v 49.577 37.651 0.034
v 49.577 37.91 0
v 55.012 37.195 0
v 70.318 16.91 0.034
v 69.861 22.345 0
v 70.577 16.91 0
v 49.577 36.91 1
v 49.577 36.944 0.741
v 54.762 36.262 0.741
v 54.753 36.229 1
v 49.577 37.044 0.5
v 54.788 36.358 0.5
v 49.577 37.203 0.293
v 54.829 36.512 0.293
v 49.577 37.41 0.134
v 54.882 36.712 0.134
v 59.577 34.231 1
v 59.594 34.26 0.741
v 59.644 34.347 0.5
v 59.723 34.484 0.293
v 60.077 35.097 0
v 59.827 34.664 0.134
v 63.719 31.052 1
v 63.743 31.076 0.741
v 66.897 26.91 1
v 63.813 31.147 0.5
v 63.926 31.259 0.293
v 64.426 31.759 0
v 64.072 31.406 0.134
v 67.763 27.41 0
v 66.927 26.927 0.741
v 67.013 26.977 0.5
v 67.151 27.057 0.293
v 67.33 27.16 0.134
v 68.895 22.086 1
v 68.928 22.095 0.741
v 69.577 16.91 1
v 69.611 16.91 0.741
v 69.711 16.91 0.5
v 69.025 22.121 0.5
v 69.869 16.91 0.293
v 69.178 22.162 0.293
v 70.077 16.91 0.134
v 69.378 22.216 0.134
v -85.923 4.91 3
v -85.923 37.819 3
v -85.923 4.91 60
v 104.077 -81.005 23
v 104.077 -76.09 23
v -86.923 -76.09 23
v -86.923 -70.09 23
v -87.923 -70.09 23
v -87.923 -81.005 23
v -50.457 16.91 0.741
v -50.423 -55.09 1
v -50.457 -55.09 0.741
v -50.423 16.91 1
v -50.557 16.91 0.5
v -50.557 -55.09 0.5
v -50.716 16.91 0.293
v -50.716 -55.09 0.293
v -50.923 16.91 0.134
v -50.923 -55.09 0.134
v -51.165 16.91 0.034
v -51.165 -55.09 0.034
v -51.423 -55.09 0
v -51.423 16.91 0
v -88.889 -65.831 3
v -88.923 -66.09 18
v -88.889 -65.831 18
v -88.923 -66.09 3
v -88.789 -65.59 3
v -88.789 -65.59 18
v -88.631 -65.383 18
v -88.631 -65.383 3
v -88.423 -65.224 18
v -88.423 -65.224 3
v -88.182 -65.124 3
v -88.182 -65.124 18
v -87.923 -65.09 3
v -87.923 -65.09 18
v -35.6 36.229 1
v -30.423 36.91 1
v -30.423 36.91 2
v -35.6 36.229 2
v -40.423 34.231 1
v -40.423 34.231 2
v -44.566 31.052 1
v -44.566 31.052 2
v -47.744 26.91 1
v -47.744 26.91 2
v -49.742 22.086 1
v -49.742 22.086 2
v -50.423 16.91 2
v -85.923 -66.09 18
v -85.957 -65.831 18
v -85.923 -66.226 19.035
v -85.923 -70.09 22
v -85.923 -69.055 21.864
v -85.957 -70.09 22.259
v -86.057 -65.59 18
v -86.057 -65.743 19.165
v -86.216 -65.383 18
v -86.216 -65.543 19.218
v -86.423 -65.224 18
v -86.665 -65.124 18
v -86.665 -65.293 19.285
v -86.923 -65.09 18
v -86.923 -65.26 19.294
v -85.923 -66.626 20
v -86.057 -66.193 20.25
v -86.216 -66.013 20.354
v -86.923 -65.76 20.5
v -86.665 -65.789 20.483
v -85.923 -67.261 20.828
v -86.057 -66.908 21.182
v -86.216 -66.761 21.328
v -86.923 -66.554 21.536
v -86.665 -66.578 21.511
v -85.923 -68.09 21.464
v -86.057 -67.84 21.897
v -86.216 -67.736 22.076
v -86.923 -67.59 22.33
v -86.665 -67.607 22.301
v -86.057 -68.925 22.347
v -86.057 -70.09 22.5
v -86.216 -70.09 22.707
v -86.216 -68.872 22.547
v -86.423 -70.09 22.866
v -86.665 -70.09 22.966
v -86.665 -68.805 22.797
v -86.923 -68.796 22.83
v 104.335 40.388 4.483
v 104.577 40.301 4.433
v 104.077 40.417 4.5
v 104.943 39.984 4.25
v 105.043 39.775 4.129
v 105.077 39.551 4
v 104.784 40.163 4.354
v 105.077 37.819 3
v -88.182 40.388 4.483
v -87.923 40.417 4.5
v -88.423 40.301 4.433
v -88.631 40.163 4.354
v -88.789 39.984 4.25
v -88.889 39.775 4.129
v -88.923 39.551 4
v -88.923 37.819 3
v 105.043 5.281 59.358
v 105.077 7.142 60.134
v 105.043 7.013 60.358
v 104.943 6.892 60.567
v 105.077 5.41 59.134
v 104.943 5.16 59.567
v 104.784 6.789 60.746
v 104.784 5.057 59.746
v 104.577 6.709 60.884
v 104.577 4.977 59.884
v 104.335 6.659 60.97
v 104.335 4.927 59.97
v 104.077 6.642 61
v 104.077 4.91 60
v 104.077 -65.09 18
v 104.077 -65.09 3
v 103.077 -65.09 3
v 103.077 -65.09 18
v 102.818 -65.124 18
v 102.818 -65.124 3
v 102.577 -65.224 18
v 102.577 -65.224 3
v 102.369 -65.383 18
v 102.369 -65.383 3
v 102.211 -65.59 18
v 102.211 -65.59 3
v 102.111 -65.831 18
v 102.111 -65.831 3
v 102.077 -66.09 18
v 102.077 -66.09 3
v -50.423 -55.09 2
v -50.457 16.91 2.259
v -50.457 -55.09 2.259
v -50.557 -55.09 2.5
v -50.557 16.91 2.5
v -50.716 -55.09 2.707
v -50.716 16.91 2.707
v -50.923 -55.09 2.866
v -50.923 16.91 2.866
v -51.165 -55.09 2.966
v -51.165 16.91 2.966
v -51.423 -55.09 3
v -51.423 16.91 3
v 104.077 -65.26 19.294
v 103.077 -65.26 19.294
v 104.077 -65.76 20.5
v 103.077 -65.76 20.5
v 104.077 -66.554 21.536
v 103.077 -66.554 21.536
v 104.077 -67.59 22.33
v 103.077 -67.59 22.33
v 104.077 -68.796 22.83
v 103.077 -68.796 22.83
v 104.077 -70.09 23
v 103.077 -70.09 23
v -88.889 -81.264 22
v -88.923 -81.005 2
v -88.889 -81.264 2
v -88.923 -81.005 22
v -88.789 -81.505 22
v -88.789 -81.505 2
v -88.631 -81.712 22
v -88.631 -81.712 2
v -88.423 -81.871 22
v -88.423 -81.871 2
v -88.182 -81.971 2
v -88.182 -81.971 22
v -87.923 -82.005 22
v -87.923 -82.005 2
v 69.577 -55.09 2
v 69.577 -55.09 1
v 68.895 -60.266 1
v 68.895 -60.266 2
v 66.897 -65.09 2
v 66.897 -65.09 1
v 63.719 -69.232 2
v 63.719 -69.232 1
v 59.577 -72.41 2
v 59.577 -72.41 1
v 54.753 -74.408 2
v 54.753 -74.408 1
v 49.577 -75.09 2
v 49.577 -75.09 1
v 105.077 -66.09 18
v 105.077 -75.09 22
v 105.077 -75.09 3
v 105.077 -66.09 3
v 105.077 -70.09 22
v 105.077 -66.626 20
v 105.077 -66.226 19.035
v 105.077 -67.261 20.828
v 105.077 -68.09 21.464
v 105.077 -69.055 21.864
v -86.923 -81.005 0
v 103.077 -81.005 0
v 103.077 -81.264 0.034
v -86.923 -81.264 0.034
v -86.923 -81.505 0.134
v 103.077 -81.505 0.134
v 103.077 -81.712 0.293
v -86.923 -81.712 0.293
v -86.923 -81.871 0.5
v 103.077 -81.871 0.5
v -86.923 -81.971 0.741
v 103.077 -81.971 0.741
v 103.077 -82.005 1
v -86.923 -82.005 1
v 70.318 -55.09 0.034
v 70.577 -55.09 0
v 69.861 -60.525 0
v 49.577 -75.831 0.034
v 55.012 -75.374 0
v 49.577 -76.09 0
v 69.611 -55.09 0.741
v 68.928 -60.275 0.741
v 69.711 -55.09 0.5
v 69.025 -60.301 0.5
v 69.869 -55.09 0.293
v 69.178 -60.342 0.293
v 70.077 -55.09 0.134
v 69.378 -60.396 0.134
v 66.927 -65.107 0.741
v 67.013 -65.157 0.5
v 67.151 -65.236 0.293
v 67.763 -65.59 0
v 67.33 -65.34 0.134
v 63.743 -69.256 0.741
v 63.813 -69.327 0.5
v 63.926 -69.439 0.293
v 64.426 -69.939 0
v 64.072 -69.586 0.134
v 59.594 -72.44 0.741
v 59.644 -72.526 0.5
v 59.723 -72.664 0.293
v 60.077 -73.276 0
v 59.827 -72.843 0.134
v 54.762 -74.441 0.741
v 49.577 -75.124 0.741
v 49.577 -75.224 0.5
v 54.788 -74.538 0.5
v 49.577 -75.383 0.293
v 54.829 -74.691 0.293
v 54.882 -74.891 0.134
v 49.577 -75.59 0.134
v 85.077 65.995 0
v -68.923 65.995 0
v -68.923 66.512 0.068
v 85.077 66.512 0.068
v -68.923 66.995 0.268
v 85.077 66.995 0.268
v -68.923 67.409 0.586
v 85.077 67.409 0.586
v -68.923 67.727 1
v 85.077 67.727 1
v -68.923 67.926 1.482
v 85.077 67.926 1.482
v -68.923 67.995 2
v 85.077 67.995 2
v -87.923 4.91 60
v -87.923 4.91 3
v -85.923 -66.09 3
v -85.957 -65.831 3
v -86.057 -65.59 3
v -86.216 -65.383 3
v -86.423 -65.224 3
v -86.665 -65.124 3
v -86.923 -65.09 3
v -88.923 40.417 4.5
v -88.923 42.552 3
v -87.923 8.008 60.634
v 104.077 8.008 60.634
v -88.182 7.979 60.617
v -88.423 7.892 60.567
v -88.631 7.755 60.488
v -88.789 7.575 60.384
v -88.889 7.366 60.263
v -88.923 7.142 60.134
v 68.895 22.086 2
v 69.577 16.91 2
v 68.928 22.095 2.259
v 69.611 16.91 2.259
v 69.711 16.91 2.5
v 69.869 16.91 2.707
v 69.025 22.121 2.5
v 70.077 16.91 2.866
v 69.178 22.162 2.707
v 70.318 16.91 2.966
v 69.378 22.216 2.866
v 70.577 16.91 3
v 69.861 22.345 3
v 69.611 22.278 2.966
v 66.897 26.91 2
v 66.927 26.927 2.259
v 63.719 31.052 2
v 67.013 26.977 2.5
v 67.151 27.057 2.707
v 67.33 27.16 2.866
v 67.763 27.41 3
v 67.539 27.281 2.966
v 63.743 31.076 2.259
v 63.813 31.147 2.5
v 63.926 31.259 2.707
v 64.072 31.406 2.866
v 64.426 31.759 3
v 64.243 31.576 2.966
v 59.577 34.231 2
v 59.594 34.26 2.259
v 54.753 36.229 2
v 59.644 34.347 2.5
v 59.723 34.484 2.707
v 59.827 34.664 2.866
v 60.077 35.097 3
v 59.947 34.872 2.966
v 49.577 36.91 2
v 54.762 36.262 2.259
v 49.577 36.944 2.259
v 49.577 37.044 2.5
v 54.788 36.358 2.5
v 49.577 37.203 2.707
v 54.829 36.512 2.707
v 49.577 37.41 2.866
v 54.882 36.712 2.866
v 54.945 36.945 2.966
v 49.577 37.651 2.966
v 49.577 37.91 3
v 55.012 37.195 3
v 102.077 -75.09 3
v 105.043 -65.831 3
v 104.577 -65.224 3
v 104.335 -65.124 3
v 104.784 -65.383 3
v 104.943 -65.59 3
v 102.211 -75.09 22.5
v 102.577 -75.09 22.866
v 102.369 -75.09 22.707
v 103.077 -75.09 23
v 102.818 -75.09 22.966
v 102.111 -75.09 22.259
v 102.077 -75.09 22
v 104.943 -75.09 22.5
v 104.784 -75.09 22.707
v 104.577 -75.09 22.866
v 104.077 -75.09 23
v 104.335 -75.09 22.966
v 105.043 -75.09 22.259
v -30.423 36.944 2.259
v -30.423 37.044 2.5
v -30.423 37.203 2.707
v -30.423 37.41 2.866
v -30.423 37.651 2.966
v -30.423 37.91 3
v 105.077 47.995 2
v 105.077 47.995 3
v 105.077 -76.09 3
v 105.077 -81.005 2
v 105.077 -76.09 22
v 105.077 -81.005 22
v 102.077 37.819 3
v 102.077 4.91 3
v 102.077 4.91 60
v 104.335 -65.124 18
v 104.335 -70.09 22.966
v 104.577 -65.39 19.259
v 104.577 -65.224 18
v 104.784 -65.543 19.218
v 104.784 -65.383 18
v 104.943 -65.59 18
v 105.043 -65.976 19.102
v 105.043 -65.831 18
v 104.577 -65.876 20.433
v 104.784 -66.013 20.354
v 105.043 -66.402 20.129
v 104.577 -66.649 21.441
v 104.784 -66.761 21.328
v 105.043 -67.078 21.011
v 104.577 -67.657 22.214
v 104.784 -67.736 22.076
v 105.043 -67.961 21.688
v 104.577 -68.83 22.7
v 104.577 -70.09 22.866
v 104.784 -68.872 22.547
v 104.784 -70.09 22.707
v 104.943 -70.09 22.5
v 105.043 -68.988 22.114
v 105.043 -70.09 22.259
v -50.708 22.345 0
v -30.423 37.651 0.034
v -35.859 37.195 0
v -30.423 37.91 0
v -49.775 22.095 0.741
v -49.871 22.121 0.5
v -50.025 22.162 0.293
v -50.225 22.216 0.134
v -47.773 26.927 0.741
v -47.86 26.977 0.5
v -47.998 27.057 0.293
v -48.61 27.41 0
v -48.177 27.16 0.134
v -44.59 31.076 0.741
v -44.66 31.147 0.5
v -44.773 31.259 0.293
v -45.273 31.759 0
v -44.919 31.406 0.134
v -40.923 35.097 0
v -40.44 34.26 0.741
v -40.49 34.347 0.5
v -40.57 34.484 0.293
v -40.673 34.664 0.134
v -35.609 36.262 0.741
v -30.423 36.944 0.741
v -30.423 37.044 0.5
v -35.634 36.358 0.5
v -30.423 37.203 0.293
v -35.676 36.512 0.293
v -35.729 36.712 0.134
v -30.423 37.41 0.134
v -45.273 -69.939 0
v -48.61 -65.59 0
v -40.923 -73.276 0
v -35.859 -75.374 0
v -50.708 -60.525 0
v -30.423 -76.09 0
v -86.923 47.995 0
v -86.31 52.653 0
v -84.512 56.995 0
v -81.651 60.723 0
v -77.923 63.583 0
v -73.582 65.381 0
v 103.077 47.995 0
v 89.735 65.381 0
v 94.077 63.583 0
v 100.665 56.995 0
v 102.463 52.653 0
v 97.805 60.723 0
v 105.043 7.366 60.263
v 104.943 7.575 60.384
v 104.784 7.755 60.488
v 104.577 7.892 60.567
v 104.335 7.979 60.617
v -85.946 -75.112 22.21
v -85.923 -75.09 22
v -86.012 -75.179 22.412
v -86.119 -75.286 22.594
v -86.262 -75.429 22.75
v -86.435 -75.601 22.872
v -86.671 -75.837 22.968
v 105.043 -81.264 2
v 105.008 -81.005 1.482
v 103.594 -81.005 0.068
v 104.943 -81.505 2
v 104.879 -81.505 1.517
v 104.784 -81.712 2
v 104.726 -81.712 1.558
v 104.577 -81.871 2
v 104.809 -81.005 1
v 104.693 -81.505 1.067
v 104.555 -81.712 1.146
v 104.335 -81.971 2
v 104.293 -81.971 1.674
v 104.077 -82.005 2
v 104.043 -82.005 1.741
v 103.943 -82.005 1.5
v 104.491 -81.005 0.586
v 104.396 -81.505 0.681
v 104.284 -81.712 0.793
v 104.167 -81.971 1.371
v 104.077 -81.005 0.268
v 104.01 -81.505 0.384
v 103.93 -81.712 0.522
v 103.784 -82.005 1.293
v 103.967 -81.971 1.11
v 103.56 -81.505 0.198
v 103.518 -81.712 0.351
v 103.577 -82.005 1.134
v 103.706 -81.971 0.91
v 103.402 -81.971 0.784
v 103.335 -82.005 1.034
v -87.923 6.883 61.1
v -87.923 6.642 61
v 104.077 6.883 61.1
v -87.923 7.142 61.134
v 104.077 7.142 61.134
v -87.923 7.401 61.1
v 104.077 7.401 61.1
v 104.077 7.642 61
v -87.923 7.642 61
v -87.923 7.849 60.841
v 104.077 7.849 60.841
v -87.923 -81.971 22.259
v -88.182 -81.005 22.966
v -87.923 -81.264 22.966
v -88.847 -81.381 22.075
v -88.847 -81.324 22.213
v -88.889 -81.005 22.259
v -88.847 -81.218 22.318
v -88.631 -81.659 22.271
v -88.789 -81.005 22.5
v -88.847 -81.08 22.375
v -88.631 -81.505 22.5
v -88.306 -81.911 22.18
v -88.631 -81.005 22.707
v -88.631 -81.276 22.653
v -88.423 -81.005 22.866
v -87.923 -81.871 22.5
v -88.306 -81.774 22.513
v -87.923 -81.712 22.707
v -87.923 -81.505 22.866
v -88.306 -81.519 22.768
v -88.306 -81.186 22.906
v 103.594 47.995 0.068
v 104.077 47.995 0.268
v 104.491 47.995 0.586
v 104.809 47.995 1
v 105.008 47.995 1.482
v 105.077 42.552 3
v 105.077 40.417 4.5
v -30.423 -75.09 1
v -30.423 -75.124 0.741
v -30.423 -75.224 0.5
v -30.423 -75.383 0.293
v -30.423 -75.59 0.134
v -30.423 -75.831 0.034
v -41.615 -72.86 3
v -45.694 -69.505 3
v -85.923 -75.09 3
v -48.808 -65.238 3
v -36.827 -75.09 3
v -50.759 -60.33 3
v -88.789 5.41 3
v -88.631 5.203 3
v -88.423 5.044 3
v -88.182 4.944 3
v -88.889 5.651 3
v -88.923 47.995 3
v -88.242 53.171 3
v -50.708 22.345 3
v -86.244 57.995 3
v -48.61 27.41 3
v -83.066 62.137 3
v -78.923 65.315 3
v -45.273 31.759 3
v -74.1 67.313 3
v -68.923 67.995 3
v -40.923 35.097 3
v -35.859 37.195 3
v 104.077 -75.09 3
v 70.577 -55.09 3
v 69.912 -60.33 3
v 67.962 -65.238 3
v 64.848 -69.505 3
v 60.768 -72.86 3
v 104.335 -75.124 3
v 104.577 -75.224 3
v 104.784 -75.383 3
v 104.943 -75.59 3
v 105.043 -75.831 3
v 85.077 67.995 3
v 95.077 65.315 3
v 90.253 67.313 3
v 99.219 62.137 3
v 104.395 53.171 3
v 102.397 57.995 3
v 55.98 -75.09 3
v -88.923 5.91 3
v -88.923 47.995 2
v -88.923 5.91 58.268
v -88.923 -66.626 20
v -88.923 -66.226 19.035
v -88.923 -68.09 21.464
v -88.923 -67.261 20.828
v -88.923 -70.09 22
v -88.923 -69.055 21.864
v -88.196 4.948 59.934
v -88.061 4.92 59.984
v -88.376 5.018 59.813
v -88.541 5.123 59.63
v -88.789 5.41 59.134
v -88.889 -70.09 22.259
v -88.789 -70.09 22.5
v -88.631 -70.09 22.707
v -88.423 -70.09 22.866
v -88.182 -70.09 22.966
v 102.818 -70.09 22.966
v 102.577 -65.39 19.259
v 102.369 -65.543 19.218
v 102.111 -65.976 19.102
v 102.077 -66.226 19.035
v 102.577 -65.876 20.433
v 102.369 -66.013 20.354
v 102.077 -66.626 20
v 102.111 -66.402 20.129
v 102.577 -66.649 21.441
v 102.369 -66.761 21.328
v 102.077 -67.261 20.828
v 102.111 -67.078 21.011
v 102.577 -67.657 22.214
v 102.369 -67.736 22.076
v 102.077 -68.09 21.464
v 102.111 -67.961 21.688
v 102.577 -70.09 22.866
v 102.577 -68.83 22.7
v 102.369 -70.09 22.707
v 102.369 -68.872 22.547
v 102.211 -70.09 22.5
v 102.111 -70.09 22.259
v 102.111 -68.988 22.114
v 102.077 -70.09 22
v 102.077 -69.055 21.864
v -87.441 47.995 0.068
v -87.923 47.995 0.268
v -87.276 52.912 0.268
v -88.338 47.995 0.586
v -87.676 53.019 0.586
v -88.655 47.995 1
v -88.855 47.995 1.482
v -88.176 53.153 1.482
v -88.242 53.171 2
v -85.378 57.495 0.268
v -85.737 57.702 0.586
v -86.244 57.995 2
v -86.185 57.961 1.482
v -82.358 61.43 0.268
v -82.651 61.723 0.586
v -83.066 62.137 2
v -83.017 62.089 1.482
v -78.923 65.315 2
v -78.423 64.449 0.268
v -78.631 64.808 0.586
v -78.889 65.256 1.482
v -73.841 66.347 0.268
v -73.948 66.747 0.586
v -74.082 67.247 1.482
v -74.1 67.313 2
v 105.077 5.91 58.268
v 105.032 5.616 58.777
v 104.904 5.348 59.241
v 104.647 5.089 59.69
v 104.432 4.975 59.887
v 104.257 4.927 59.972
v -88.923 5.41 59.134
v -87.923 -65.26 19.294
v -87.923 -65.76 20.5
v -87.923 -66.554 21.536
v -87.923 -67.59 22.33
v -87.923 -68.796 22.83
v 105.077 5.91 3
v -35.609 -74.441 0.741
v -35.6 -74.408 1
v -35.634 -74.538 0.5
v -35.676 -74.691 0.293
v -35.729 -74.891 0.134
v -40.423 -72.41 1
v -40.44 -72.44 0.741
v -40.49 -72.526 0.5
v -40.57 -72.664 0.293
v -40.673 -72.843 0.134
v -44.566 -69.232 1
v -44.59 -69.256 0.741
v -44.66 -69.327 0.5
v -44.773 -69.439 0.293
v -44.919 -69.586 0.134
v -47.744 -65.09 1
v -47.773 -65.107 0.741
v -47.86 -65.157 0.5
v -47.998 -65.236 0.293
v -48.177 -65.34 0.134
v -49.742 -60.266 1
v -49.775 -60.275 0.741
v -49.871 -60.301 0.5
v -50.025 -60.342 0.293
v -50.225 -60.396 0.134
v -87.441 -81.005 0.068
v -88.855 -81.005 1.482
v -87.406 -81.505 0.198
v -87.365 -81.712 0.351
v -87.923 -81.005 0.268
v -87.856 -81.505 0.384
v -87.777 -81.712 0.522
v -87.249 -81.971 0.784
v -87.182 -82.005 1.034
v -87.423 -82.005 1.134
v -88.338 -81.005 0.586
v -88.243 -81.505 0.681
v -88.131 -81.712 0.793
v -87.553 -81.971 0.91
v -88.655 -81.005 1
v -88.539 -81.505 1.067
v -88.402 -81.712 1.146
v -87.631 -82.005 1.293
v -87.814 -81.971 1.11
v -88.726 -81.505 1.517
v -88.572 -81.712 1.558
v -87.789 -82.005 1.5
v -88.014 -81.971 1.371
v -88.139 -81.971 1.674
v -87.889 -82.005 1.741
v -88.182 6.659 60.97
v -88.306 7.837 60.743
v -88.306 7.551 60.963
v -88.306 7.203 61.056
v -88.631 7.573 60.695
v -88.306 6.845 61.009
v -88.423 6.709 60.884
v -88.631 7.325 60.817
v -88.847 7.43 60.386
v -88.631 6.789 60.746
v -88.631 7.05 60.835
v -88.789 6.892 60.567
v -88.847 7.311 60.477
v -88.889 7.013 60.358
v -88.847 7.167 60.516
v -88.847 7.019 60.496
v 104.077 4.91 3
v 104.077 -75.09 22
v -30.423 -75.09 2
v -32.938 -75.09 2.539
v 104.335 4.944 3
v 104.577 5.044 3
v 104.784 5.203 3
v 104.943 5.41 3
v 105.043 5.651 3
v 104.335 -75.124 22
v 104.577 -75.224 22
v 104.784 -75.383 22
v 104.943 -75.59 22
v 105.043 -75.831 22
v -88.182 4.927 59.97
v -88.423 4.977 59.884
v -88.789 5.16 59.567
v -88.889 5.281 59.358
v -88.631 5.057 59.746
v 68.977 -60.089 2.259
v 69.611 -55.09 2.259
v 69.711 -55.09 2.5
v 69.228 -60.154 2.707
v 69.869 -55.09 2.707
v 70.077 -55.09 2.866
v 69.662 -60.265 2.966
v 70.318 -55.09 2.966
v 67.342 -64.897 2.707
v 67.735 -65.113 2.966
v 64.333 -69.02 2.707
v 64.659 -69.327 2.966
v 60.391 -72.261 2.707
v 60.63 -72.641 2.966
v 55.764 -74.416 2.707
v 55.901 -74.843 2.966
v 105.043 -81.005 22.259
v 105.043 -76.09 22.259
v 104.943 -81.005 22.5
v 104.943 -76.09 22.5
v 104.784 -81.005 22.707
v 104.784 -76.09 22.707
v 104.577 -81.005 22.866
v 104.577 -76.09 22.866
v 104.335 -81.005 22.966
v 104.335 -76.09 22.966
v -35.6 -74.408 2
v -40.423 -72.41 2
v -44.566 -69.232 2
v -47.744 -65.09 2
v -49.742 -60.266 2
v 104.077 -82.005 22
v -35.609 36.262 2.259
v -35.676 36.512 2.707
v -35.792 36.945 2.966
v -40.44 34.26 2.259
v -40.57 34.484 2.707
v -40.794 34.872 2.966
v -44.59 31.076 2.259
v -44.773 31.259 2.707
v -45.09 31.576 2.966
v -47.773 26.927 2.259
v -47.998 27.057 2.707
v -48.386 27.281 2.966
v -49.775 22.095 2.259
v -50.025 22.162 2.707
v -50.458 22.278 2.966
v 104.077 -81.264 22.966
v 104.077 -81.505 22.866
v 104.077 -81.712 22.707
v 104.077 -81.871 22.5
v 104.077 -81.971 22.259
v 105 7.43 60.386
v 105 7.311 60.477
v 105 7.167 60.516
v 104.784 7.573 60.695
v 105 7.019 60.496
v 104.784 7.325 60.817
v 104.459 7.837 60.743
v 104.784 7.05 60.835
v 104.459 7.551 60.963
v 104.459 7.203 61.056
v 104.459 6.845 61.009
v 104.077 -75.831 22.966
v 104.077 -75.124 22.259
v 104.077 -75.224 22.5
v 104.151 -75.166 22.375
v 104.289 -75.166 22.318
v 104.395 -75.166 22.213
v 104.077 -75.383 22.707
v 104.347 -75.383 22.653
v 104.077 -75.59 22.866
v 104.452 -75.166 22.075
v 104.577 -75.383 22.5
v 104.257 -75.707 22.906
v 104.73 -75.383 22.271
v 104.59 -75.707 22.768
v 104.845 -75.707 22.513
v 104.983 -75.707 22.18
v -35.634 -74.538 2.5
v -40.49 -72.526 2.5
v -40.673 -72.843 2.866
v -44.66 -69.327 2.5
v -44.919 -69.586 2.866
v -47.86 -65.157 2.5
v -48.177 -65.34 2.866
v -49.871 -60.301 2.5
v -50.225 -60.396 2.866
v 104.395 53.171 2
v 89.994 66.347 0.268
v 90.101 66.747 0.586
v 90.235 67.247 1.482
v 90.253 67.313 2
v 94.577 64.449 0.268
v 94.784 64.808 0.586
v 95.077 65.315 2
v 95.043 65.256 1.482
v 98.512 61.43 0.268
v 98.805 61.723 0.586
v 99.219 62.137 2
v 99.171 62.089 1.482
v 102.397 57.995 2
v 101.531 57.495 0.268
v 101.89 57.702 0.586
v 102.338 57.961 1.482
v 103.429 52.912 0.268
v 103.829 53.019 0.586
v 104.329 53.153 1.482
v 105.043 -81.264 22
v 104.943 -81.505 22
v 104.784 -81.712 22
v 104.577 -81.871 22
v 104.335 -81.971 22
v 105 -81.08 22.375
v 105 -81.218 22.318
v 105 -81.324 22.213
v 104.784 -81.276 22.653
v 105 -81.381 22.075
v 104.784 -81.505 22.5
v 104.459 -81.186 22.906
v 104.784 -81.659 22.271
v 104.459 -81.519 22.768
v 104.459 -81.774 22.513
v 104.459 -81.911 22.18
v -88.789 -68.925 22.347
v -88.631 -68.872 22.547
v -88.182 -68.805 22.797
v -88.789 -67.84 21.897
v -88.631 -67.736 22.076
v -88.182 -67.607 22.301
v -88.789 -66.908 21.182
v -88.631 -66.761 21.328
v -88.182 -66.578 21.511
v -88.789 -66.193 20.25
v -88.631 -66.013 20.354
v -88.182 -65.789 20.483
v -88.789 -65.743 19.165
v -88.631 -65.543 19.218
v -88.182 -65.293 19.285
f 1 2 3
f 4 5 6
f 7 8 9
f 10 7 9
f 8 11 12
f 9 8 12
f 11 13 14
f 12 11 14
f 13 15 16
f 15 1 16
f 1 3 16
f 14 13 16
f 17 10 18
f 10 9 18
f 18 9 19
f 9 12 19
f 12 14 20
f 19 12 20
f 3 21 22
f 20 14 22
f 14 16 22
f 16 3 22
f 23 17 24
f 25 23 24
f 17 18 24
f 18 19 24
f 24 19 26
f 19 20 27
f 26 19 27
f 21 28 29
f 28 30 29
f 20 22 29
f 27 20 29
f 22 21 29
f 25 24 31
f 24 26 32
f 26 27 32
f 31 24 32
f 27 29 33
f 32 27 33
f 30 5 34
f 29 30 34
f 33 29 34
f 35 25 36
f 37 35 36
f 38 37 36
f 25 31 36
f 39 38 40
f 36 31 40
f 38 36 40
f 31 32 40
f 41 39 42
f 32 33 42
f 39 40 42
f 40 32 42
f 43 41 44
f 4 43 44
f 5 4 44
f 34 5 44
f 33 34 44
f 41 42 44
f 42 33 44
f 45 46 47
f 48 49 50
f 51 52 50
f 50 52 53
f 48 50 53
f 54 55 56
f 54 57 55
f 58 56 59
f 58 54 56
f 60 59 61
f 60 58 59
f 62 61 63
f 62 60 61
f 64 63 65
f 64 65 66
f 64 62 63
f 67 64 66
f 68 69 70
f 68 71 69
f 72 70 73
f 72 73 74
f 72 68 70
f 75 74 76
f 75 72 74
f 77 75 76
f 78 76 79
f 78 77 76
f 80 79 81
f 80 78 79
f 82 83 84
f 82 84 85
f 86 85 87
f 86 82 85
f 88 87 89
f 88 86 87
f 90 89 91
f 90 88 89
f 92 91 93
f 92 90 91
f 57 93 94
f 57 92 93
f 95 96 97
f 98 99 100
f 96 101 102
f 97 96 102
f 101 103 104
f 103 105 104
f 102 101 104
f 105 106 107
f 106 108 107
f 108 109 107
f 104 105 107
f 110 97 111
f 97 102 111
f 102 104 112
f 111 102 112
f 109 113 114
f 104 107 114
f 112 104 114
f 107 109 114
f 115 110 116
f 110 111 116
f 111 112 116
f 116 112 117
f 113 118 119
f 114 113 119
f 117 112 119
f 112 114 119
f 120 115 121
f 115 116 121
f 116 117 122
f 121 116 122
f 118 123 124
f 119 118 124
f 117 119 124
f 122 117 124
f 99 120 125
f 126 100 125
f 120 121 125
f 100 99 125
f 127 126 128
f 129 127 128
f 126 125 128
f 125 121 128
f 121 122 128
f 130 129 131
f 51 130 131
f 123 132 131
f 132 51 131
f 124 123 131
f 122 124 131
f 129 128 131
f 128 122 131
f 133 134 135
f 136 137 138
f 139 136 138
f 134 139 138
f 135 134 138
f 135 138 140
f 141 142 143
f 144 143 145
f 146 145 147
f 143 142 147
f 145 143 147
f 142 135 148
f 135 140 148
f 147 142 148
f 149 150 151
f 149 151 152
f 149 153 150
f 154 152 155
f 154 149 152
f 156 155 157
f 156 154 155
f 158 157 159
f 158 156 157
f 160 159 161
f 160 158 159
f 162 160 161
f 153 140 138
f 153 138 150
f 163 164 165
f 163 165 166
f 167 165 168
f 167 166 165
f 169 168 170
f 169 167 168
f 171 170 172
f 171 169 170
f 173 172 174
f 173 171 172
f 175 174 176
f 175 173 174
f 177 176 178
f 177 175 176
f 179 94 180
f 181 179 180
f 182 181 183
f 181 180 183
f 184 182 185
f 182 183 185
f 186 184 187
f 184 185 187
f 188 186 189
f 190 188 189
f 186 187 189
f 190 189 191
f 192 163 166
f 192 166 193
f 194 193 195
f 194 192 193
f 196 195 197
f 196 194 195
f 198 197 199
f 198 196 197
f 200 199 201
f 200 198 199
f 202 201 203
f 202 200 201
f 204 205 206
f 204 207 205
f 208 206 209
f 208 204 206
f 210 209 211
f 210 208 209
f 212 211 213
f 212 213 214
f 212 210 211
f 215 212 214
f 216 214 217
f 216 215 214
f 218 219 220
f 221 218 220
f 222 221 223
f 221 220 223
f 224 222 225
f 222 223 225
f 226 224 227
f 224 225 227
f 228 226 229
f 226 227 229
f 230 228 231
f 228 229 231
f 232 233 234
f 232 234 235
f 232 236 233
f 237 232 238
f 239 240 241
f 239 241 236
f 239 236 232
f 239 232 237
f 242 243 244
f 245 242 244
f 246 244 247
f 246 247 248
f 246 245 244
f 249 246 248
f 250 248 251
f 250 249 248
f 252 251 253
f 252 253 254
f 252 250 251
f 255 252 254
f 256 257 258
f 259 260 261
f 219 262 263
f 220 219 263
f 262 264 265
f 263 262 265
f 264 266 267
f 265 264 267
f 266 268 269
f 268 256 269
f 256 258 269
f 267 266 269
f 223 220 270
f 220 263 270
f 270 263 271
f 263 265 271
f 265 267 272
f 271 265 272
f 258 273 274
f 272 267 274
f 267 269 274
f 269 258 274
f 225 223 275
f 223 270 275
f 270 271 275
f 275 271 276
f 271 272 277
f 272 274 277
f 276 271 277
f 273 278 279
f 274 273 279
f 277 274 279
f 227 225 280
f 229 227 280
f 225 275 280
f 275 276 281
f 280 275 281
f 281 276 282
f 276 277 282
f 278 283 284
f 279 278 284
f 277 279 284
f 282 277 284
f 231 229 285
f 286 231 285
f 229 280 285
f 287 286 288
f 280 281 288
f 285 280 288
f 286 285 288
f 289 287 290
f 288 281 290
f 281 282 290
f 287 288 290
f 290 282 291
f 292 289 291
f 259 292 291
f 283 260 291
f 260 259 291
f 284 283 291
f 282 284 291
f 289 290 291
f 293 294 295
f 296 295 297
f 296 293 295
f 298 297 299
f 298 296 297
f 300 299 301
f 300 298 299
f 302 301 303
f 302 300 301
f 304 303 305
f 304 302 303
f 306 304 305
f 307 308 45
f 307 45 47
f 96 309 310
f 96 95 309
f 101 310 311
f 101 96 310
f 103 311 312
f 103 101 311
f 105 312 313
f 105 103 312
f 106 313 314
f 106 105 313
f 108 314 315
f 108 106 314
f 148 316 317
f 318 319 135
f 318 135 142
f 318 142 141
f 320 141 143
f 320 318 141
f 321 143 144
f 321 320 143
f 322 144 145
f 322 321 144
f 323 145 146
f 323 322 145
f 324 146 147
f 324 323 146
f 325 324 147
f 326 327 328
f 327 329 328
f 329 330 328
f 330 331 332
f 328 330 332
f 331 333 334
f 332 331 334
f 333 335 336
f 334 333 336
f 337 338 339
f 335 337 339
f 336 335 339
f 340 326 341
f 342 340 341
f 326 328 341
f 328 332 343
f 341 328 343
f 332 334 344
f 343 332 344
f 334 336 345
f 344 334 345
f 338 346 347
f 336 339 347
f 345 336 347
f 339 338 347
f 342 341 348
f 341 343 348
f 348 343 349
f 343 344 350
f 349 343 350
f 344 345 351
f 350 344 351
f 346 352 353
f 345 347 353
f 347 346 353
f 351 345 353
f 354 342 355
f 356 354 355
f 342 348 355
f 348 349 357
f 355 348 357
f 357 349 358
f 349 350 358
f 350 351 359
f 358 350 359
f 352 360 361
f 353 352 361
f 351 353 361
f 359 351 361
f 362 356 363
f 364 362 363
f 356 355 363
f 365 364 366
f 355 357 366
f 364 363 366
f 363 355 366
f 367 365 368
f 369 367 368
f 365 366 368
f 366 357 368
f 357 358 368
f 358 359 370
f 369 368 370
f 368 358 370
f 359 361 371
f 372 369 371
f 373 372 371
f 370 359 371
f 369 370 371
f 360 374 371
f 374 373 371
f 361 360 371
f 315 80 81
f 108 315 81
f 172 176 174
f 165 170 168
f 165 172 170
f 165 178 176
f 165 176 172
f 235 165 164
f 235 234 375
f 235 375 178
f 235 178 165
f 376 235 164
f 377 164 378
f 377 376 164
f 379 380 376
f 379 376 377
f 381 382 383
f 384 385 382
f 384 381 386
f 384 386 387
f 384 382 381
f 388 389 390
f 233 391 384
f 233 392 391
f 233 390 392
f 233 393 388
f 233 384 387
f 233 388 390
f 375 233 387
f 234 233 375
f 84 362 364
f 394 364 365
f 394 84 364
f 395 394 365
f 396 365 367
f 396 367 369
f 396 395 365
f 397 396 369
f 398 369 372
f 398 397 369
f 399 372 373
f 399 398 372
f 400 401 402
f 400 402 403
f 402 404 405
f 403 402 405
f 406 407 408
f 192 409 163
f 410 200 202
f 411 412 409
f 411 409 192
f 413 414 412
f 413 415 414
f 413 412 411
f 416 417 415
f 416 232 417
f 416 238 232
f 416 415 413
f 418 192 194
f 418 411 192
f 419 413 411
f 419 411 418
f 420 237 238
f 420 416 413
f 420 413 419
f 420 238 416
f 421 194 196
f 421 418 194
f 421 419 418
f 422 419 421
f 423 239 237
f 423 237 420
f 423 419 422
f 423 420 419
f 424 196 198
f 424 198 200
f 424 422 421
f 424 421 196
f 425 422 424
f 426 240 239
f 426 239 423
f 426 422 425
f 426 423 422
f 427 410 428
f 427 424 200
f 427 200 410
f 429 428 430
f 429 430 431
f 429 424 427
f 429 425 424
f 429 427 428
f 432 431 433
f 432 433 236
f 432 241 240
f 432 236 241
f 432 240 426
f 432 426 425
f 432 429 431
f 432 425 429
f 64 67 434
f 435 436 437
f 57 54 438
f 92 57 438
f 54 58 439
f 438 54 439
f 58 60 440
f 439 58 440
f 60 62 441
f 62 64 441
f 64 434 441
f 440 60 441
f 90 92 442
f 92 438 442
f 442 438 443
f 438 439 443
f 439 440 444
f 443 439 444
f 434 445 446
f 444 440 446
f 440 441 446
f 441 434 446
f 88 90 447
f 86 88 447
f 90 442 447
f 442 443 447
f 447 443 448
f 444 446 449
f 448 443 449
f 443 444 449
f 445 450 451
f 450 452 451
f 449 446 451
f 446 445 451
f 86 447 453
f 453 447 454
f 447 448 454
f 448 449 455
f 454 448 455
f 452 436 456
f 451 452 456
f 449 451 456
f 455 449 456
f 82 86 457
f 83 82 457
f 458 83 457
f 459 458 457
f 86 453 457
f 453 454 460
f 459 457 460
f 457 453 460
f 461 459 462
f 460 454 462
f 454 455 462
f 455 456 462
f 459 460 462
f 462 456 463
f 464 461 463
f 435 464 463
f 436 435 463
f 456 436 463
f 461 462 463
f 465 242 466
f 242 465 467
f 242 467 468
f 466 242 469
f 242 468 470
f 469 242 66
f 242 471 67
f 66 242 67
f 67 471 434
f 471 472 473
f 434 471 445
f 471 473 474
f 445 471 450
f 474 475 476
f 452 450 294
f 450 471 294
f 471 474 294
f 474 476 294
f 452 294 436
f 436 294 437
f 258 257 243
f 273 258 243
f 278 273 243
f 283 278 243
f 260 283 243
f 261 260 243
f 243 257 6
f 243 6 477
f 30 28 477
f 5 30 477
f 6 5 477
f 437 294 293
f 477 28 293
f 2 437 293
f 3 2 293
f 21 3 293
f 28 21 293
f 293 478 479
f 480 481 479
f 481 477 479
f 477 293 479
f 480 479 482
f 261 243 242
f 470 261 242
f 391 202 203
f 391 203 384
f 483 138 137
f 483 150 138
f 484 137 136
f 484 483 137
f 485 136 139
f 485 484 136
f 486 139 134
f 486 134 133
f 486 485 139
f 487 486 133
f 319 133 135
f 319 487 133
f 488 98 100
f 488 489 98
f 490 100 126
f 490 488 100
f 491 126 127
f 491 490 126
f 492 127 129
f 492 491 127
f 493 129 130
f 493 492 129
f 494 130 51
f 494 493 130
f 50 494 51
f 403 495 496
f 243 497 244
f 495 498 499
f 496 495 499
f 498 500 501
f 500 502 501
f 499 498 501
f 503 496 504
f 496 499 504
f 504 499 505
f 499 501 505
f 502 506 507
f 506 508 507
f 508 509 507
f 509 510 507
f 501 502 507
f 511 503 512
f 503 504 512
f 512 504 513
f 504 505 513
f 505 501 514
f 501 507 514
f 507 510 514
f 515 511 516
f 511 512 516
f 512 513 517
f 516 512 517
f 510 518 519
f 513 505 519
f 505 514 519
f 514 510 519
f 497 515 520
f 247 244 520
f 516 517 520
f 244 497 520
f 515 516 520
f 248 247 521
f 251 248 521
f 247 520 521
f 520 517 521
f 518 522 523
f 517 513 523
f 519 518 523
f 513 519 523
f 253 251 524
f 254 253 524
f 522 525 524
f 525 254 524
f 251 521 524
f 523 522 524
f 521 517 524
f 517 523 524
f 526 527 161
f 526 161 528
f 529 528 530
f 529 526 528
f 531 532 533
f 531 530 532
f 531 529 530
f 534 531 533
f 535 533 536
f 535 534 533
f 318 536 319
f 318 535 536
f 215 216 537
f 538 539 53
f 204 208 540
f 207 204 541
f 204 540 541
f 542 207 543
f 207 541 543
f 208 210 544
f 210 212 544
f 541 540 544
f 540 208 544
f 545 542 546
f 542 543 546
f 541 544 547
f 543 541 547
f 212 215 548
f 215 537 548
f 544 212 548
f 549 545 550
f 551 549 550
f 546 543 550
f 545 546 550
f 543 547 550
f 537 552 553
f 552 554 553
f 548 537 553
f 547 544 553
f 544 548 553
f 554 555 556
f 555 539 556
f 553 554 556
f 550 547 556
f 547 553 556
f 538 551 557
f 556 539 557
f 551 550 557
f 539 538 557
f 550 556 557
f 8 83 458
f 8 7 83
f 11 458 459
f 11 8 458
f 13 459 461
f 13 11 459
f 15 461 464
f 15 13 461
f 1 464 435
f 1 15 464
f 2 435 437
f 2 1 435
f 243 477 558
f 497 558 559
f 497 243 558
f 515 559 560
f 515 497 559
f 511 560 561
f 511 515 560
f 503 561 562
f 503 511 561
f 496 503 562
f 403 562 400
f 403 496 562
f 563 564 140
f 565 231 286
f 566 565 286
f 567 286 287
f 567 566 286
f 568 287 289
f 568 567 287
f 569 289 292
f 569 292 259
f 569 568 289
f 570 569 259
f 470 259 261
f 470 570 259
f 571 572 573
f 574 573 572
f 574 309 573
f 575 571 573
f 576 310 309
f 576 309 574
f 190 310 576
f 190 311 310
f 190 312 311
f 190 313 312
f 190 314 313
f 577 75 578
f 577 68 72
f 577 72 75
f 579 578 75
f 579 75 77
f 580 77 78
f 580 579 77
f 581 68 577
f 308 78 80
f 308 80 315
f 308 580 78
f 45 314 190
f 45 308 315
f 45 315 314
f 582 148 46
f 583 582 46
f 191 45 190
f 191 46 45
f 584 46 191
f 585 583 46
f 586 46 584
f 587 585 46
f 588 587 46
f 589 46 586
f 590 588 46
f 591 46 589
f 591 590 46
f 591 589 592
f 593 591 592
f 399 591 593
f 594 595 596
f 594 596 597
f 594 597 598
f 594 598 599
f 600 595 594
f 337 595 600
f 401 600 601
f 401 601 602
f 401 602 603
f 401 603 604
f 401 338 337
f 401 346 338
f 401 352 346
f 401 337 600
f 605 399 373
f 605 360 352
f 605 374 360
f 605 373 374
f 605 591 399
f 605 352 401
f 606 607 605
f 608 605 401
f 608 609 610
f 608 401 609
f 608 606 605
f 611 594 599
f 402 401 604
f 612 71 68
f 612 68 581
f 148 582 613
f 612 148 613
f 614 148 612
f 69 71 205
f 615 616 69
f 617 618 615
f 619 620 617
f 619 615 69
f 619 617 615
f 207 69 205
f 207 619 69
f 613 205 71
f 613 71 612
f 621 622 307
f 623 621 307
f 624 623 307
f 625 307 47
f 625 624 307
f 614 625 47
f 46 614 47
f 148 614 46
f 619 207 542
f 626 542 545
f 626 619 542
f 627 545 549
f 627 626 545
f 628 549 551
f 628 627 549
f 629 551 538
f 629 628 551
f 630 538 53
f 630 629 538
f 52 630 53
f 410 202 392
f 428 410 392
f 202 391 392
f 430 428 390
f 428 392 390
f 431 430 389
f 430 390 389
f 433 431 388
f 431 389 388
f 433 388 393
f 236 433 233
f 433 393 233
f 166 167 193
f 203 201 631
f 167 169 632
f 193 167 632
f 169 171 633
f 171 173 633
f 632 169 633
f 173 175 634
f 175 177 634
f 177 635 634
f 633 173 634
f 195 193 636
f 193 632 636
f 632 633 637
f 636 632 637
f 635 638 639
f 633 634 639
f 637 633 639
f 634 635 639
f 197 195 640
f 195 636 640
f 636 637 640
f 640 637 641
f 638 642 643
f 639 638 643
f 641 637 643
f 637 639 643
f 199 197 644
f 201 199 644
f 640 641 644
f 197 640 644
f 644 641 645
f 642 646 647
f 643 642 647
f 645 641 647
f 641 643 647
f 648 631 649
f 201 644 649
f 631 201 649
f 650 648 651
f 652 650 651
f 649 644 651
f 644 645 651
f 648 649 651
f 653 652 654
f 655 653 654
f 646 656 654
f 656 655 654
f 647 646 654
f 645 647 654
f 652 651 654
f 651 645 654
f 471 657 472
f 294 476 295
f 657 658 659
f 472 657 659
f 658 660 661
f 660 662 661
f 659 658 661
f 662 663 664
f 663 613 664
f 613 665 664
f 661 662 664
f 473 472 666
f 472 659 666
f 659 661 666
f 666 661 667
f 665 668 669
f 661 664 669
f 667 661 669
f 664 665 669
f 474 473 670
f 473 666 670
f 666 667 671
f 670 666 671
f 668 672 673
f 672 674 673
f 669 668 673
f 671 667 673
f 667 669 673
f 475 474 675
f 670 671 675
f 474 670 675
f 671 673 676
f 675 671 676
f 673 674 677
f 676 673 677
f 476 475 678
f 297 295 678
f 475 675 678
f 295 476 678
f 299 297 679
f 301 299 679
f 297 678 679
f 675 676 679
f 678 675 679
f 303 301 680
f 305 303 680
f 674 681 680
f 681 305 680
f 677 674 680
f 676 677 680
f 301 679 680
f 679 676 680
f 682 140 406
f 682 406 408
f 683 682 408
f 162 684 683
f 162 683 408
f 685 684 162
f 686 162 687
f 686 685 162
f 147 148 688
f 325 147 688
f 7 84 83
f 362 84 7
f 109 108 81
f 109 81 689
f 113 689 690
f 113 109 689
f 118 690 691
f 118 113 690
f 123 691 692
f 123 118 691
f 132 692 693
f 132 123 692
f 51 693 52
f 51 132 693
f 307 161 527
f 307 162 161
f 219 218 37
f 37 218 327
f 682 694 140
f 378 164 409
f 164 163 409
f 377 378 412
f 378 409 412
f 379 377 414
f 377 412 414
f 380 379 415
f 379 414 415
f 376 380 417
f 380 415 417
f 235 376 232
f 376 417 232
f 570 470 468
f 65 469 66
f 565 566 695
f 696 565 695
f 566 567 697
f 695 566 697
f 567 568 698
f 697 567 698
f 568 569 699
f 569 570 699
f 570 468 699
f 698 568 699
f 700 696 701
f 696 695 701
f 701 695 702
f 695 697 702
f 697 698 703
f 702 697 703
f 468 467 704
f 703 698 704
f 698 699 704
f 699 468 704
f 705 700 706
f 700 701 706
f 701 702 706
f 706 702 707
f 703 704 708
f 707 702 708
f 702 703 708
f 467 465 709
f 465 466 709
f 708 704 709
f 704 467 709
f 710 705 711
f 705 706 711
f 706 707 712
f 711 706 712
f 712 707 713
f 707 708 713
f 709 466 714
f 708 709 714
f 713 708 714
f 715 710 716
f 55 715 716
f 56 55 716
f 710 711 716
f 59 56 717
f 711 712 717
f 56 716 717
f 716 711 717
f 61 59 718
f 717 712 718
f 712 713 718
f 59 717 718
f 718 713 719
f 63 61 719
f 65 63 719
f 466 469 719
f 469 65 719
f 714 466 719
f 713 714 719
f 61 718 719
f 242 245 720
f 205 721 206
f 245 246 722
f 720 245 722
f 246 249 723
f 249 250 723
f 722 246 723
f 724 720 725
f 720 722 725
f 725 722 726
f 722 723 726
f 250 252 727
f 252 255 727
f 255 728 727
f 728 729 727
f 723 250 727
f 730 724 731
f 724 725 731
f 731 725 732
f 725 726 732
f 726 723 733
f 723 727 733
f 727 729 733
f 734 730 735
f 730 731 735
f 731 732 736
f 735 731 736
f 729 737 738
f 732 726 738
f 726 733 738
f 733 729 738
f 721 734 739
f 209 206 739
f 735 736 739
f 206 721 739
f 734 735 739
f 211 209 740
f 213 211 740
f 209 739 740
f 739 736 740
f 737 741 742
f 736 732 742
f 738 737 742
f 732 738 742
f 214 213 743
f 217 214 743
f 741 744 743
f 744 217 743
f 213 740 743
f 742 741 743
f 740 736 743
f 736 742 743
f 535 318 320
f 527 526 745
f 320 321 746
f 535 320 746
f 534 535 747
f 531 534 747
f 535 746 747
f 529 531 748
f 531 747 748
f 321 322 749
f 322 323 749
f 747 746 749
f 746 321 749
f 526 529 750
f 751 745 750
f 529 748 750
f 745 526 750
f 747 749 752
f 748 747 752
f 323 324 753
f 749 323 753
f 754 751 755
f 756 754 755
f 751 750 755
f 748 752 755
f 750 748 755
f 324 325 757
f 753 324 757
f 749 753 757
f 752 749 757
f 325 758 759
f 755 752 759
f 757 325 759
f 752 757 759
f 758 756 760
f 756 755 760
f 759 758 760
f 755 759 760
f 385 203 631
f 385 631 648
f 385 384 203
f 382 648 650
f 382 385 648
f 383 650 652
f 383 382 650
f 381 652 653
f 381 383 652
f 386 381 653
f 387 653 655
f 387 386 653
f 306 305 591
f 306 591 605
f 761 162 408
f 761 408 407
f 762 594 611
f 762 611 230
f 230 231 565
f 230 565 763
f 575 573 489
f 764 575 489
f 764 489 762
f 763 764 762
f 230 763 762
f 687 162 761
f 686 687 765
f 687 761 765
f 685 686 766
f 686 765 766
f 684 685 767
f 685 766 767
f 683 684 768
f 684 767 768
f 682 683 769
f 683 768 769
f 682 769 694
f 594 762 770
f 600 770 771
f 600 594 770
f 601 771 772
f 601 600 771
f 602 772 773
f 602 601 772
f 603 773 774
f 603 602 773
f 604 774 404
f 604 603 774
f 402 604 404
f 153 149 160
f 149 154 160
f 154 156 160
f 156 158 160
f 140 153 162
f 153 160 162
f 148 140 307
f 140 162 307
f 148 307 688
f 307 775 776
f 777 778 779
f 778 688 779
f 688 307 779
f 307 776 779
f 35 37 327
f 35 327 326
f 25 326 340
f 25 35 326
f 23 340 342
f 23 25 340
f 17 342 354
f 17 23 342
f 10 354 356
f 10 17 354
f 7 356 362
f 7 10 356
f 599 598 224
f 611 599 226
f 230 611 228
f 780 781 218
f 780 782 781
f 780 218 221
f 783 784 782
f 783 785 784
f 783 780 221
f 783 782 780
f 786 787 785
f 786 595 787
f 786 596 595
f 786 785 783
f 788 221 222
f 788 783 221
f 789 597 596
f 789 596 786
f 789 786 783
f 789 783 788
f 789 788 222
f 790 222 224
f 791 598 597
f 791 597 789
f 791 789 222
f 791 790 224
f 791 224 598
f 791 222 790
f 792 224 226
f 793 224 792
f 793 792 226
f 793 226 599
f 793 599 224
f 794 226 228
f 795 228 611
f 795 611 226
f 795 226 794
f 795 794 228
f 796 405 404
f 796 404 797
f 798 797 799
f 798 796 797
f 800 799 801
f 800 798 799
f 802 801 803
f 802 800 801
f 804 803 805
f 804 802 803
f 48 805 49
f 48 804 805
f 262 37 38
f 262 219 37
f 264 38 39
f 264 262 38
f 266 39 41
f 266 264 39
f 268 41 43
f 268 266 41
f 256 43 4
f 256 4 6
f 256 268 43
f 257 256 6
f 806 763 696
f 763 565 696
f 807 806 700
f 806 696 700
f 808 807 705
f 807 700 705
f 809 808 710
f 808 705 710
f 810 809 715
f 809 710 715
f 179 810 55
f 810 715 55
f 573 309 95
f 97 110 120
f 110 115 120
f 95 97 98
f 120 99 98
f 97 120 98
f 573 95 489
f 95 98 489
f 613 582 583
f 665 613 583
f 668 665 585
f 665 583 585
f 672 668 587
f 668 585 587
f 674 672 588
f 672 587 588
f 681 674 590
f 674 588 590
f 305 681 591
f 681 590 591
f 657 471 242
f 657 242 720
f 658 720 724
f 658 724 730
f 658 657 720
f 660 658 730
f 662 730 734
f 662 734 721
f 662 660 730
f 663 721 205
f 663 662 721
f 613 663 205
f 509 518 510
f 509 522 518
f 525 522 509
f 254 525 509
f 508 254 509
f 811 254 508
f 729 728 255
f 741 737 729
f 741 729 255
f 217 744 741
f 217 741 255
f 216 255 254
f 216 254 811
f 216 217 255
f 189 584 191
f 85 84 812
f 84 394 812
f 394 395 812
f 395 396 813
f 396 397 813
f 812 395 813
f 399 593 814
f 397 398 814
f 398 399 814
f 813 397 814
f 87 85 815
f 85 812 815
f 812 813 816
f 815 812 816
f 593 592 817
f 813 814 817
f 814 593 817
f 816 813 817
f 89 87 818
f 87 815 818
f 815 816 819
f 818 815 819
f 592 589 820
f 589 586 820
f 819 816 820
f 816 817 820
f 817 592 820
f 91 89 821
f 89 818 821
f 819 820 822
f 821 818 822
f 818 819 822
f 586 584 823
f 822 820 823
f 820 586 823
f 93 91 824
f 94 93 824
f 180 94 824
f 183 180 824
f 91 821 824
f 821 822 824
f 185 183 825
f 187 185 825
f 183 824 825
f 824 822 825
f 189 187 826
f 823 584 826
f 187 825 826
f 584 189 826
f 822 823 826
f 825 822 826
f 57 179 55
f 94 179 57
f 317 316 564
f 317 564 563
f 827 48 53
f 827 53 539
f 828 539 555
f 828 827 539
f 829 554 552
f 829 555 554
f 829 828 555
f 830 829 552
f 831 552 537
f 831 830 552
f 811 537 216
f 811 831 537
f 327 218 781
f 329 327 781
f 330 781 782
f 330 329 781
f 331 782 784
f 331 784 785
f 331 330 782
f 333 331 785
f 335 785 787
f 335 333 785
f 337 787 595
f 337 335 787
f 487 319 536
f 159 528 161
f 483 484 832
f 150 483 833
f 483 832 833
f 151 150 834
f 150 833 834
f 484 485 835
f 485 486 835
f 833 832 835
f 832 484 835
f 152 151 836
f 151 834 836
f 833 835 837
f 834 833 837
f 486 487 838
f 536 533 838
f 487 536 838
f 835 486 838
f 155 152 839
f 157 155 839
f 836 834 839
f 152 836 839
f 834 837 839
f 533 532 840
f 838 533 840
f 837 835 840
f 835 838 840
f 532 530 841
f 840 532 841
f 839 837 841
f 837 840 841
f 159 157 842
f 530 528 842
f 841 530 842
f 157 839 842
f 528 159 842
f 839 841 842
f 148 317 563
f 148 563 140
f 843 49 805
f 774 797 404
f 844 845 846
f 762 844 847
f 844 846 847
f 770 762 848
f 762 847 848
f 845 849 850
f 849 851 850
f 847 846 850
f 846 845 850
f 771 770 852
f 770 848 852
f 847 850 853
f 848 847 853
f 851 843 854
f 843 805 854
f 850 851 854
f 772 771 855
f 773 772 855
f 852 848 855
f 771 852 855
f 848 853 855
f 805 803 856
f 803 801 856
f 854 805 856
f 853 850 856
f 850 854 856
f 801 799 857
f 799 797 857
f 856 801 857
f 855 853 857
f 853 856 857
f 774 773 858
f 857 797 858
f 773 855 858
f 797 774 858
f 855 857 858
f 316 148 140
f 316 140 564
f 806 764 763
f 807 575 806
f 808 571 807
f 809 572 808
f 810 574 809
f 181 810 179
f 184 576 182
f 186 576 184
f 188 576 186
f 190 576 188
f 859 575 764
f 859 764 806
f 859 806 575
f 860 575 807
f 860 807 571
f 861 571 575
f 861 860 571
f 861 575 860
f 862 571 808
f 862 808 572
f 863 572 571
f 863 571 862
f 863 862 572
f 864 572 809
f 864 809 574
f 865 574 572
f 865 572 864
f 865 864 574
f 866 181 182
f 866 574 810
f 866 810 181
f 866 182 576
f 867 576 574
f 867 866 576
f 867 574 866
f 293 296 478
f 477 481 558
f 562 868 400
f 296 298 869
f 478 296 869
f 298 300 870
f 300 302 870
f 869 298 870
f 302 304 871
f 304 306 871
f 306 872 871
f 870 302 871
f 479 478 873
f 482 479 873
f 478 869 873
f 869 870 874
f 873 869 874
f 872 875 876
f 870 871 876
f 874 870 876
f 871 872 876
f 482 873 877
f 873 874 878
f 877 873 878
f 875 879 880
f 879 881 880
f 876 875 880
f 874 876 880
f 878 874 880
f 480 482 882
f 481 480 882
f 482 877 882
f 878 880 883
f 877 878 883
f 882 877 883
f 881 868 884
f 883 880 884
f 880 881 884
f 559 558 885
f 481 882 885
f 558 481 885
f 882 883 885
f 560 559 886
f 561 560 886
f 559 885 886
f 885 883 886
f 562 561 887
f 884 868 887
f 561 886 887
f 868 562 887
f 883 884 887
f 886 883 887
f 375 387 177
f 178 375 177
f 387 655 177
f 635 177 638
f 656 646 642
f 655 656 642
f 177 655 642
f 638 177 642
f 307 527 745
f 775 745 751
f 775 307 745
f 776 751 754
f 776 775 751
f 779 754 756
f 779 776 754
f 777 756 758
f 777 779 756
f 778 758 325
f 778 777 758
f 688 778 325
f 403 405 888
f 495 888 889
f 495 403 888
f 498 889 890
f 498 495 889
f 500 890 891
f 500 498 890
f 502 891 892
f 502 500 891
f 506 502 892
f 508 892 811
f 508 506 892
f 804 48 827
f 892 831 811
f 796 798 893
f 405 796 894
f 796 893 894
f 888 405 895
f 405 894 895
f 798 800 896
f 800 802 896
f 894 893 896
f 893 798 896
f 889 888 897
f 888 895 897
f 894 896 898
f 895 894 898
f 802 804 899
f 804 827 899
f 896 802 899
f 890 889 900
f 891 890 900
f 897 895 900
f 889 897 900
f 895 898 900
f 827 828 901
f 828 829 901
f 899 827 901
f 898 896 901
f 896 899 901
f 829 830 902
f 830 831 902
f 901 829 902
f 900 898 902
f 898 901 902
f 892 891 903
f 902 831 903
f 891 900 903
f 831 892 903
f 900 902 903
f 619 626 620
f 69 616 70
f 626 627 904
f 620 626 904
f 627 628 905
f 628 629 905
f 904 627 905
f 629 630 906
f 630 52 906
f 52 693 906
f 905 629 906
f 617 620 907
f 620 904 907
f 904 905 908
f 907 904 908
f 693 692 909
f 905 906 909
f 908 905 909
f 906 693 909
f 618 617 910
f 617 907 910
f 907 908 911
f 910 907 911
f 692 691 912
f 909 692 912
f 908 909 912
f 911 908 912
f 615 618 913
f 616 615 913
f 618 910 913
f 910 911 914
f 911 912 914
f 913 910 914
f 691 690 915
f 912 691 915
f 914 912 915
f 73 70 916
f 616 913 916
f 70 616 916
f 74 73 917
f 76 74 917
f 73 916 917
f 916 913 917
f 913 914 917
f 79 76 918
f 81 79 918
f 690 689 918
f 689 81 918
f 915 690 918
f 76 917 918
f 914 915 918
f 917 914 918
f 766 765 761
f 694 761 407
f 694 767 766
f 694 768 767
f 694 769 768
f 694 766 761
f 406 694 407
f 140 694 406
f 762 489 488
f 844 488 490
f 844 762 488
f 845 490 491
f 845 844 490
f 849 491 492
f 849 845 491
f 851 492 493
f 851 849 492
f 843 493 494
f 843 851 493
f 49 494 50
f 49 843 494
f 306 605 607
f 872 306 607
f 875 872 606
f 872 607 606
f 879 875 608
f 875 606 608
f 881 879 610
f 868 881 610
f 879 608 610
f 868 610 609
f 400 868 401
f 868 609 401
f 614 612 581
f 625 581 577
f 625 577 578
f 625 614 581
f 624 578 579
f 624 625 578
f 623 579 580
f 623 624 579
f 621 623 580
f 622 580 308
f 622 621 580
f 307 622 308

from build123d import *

# Parameters (mm, degrees)
F0_W          = 194
F0_H          = 150
F1_DEPTH      = 3
F2_W          = 6.9154556079
F2_H          = 20
F3_DEPTH      = 194
F5_DEPTH      = 3
F7_DEPTH      = 3
F8_W          = 194
F8_H          = 65.8179306876
F9_DEPTH      = 3
F11_DEPTH     = 194
F12_W         = 10
F12_H         = 20
F13_DEPTH     = 3
F14_R         = 5
F15_R         = 1
F16_R         = 1
F18_DEPTH     = 3
F19_R         = 1
F20_R         = 1
F21_R         = 1
F22_W         = 120
F22_H         = 112
F23_DEPTH     = 3.001
F24_R         = 20
F25_R         = 20
F26_R         = 2
F27_R         = 1
F28_R         = 1
F29_R         = 1
F30_T1_DEPTH  = 72
F30_T3_DEPTH  = 80
F30_T6_ANGLE  = 90
F30_T8_ANGLE  = 90
F30_T12_ANGLE = 111.4945483856
F30_T17_ANGLE = 111.4945483856
F31_R         = 1
F31_2_R       = 1


# Not quite as in the source:
# - a fillet or chamfer that OpenCascade refuses, or shapes differently, is made with other operations: its cross-section is extruded or revolved along the edge and cut away or added


with BuildPart() as f1:
    # F0 (on Top) → F1 (new body)
    with BuildSketch(Plane.XY):
        with Locations((8.0765881836, -7.0053721947)):
            Rectangle(F0_W, F0_H)
    extrude(amount=F1_DEPTH)

    # F2 (on face) → F3 (join)
    with BuildSketch(Plane(origin=(-88.9234118164, 0, 0), x_dir=(0, -1, 0), z_dir=(-1, 0, 0))):
        with Locations((78.5476443908, 13)):
            Rectangle(F2_W, F2_H)
    extrude(amount=-F3_DEPTH)

    # F4 (on face) → F5 (join)
    with BuildSketch(Plane(origin=(-88.9234118164, 0, 0), x_dir=(0, -1, 0), z_dir=(-1, 0, 0))):
        Polygon((-4.9100834131, 60), (-37.8190487569, 3), (-4.9100834131, 3), align=None)
    extrude(amount=-F5_DEPTH)

    # F12 (on face) → F13 (join)
    with BuildSketch(Plane(origin=(-88.9234118164, 0, 0), x_dir=(0, -1, 0), z_dir=(-1, 0, 0))):
        with Locations((70.0899165869, 13)):
            Rectangle(F12_W, F12_H)
    extrude(amount=-F13_DEPTH)

    # F14
    f14_edges = [f1.edges().sort_by_distance(p)[0] for p in [
        (-87.423412, -65.089917, 23),
    ]]
    fillet(f14_edges, radius=F14_R)

    # F21
    f21_edges = [f1.edges().sort_by_distance(p)[0] for p in [
        (8.076588, -82.005372, 23),
    ]]
    fillet(f21_edges, radius=F21_R)

    # F22 (on face) → F23 (cut, through all)
    with BuildSketch(Plane.XY.offset(3)):
        with Locations((9.5765881836, -19.0899165869)):
            Rectangle(F22_W, F22_H)
    extrude(amount=-F23_DEPTH, mode=Mode.SUBTRACT)

    # F24
    f24_edges = [f1.edges().sort_by_distance(p)[0] for p in [
        (-88.923412, 67.994628, 1.5),
        (105.076588, 67.994628, 1.5),
        (69.576588, 36.910083, 1.5),
        (-50.423412, 36.910083, 1.5),
    ]]
    fillet(f24_edges, radius=F24_R)

    # F25
    f25_edges = [f1.edges().sort_by_distance(p)[0] for p in [
        (69.576588, -75.089917, 1.5),
        (-50.423412, -75.089917, 1.5),
    ]]
    fillet(f25_edges, radius=F25_R)

    # F26
    f26_edges = [f1.edges().sort_by_distance(p)[0] for p in [
        (-88.923412, -17.005372, 0),
        (105.076588, -17.005372, 0),
        (99.218724, 62.136763, 0),
        (8.076588, 67.994628, 0),
        (-83.065547, 62.136763, 0),
    ]]
    fillet(f26_edges, radius=F26_R)

    # F27
    f27_edges = [f1.edges().sort_by_distance(p)[0] for p in [
        (-88.923412, 4.910083, 31.5),
    ]]
    fillet(f27_edges, radius=F27_R)

    # F28
    f28_edges = [f1.edges().sort_by_distance(p)[0] for p in [
        (-88.923412, -82.005372, 12),
        (-88.337625, -82.005372, 0.585786),
        (8.076588, -82.005372, 22),
        (8.076588, -82.005372, 0),
        (105.076588, -82.005372, 12),
        (104.490802, -82.005372, 0.585786),
    ]]
    fillet(f28_edges, radius=F28_R)

    # F29
    f29_edges = [f1.edges().sort_by_distance(p)[0] for p in [
        (-44.565547, -69.232052, 0),
        (63.718724, -69.232052, 0),
        (9.576588, -75.089917, 0),
        (63.718724, 31.052219, 0),
        (69.576588, -19.089917, 0),
        (9.576588, 36.910083, 0),
        (-44.565547, 31.052219, 0),
        (-50.423412, -19.089917, 0),
    ]]
    fillet(f29_edges, radius=F29_R)

    # F30: fillet of radius 1 on 6 edges, made by hand

    # F30_s2 → F30_t1 (cut)
    with BuildSketch(Plane.XZ.offset(-16.9100834131)):
        with BuildLine():
            ThreePointArc((-50.4234118164, 2), (-50.7163050352, 2.7071067812), (-51.4234118164, 3))
            Line((-51.4234118164, 3), (-50.4234118164, 3))
            Line((-50.4234118164, 3), (-50.4234118164, 2))
        make_face()
        with BuildLine():
            ThreePointArc((69.5765881836, 2), (69.8694814025, 2.7071067812), (70.5765881836, 3))
            Line((70.5765881836, 3), (69.5765881836, 3))
            Line((69.5765881836, 3), (69.5765881836, 2))
        make_face()
    extrude(amount=F30_T1_DEPTH, mode=Mode.SUBTRACT)

    # F30_s4 → F30_t3 (cut)
    with BuildSketch(Plane.YZ.offset(-30.4234118164)):
        with BuildLine():
            ThreePointArc((36.9100834131, 2), (37.2029766319, 2.7071067812), (37.9100834131, 3))
            Line((37.9100834131, 3), (36.9100834131, 3))
            Line((36.9100834131, 3), (36.9100834131, 2))
        make_face()
    extrude(amount=F30_T3_DEPTH, mode=Mode.SUBTRACT)

    # F30_s5 → F30_t6 (revolve, cut)
    with BuildSketch(Plane.YZ.offset(-30.4234118164)):
        with BuildLine():
            ThreePointArc((36.9100834131, 2), (37.2029766319, 2.7071067812), (37.9100834131, 3))
            Line((37.9100834131, 3), (36.9100834131, 3))
            Line((36.9100834131, 3), (36.9100834131, 2))
        make_face()
    revolve(axis=Axis((-30.4234118164, 16.9100834131, 3), (0, 0, 1)), revolution_arc=F30_T6_ANGLE, mode=Mode.SUBTRACT)

    # F30_s7 → F30_t8 (revolve, cut)
    with BuildSketch(Plane.XZ.offset(-16.9100834131)):
        with BuildLine():
            ThreePointArc((69.5765881836, 2), (69.8694814025, 2.7071067812), (70.5765881836, 3))
            Line((70.5765881836, 3), (69.5765881836, 3))
            Line((69.5765881836, 3), (69.5765881836, 2))
        make_face()
    revolve(axis=Axis((49.5765881836, 16.9100834131, 3), (0, 0, 1)), revolution_arc=F30_T8_ANGLE, mode=Mode.SUBTRACT)


with BuildPart() as f7:
    # F6 (on face) → F7 (new body)
    with BuildSketch(Plane.YZ.offset(105.0765881836)):
        Polygon((4.9100834131, 3), (37.8190487569, 3), (4.9100834131, 60), align=None)
    extrude(amount=-F7_DEPTH)

    # F20
    f20_edges = [f7.edges().sort_by_distance(p)[0] for p in [
        (105.076588, 4.910083, 31.5),
    ]]
    fillet(f20_edges, radius=F20_R)


with BuildPart() as f9:
    # F8 (on face) → F9 (new body)
    with BuildSketch(Plane(origin=(0, 29.6633246734, 17.1261284852), x_dir=(-1, 0, 0), z_dir=(0, 0.8660254038, 0.5))):
        with Locations((-8.0765881836, 16.5975171767)):
            Rectangle(F8_W, F8_H)
    extrude(amount=F9_DEPTH)

    # F15
    f15_edges = [f9.edges().sort_by_distance(p)[0] for p in [
        (8.076588, 7.50816, 61.5),
    ]]
    fillet(f15_edges, radius=F15_R)

    # F16
    f16_edges = [f9.edges().sort_by_distance(p)[0] for p in [
        (-88.923412, 24.212642, 32.566987),
    ]]
    fillet(f16_edges, radius=F16_R)

    # F19
    f19_edges = [f9.edges().sort_by_distance(p)[0] for p in [
        (105.076588, 24.212642, 32.566987),
    ]]
    fillet(f19_edges, radius=F19_R)


with BuildPart() as f11:
    # F10 (on face) → F11 (new body)
    with BuildSketch(Plane(origin=(-88.9234118164, 0, 0), x_dir=(0, -1, 0), z_dir=(-1, 0, 0))):
        Polygon((-37.8190487569, 3), (-40.4171249683, 4.5), (-42.5518223643, 3), align=None)
    extrude(amount=-F11_DEPTH)


with BuildPart() as f18:
    # F17 (on face) → F18 (new body)
    with BuildSketch(Plane.YZ.offset(105.0765881836)):
        with BuildLine():
            Line((-65.0899165869, 3), (-65.0899165869, 18))
            ThreePointArc((-65.0899165869, 18), (-66.5543826809, 21.5355339059), (-70.0899165869, 23))
            Line((-70.0899165869, 23), (-75.0899165869, 23))
            Line((-75.0899165869, 23), (-75.0899165869, 3))
            Line((-75.0899165869, 3), (-65.0899165869, 3))
        make_face()
    extrude(amount=-F18_DEPTH)

    # F31#2
    f31_2_edges = [f18.edges().sort_by_distance(p)[0] for p in [
        (105.076588, -65.089917, 10.5),
        (105.076588, -66.554383, 21.535534),
        (102.076588, -65.089917, 10.5),
        (102.076588, -66.554383, 21.535534),
        (105.076588, -72.589917, 23),
        (102.076588, -72.589917, 23),
    ]]
    fillet(f31_2_edges, radius=F31_2_R)


with BuildPart() as f30_tool10:
    # F30_s11 → F30_t12 (revolve)
    with BuildSketch(Plane.XZ.offset(55.0899165869)):
        with BuildLine():
            ThreePointArc((69.5765881836, 2), (69.8694814025, 2.7071067812), (70.5765881836, 3))
            Line((70.5765881836, 3), (69.5765881836, 3))
            Line((69.5765881836, 3), (69.5765881836, 2))
        make_face()
    revolve(axis=Axis((49.5765881836, -55.0899165869, 3), (0, 0, -1)), revolution_arc=F30_T12_ANGLE)

    split(bisect_by=Plane.XZ.offset(75.0899165869), keep=Keep.BOTTOM)


with BuildPart() as f1_1:
    add(f1.part)

    # F30_t9: cut F30_tool10
    add(f30_tool10.part, mode=Mode.SUBTRACT)


with BuildPart() as f30_tool15:
    # F30_s16 → F30_t17 (revolve)
    with BuildSketch(Plane(origin=(-45.1205998281, -17.7685178107, 0), x_dir=(0, 0, 1), z_dir=(0.9304524359, 0.3664126971, 0))):
        with BuildLine():
            ThreePointArc((2, 60.1110227003), (2.7071067812, 60.4039159191), (3, 61.1110227003))
            Line((3, 61.1110227003), (3, 60.1110227003))
            Line((3, 60.1110227003), (2, 60.1110227003))
        make_face()
    revolve(axis=Axis((-30.4234118164, -55.0899165869, 3), (0, 0, -1)), revolution_arc=F30_T17_ANGLE)

    split(bisect_by=Plane.XZ.offset(75.0899165869), keep=Keep.BOTTOM)


with BuildPart() as f1_2:
    add(f1_1.part)

    # F30_t14: cut F30_tool15
    add(f30_tool15.part, mode=Mode.SUBTRACT)

    # F31
    f31_edges = [f1_2.edges().sort_by_distance(p)[0] for p in [
        (-85.923412, -65.089917, 10.5),
        (9.076588, -75.089917, 23),
        (-85.923412, -72.589917, 23),
        (-85.923412, -66.554383, 21.535534),
    ]]
    fillet(f31_edges, radius=F31_R)


solid = Compound([f7.part, f9.part, f11.part, f18.part, f1_2.part])
